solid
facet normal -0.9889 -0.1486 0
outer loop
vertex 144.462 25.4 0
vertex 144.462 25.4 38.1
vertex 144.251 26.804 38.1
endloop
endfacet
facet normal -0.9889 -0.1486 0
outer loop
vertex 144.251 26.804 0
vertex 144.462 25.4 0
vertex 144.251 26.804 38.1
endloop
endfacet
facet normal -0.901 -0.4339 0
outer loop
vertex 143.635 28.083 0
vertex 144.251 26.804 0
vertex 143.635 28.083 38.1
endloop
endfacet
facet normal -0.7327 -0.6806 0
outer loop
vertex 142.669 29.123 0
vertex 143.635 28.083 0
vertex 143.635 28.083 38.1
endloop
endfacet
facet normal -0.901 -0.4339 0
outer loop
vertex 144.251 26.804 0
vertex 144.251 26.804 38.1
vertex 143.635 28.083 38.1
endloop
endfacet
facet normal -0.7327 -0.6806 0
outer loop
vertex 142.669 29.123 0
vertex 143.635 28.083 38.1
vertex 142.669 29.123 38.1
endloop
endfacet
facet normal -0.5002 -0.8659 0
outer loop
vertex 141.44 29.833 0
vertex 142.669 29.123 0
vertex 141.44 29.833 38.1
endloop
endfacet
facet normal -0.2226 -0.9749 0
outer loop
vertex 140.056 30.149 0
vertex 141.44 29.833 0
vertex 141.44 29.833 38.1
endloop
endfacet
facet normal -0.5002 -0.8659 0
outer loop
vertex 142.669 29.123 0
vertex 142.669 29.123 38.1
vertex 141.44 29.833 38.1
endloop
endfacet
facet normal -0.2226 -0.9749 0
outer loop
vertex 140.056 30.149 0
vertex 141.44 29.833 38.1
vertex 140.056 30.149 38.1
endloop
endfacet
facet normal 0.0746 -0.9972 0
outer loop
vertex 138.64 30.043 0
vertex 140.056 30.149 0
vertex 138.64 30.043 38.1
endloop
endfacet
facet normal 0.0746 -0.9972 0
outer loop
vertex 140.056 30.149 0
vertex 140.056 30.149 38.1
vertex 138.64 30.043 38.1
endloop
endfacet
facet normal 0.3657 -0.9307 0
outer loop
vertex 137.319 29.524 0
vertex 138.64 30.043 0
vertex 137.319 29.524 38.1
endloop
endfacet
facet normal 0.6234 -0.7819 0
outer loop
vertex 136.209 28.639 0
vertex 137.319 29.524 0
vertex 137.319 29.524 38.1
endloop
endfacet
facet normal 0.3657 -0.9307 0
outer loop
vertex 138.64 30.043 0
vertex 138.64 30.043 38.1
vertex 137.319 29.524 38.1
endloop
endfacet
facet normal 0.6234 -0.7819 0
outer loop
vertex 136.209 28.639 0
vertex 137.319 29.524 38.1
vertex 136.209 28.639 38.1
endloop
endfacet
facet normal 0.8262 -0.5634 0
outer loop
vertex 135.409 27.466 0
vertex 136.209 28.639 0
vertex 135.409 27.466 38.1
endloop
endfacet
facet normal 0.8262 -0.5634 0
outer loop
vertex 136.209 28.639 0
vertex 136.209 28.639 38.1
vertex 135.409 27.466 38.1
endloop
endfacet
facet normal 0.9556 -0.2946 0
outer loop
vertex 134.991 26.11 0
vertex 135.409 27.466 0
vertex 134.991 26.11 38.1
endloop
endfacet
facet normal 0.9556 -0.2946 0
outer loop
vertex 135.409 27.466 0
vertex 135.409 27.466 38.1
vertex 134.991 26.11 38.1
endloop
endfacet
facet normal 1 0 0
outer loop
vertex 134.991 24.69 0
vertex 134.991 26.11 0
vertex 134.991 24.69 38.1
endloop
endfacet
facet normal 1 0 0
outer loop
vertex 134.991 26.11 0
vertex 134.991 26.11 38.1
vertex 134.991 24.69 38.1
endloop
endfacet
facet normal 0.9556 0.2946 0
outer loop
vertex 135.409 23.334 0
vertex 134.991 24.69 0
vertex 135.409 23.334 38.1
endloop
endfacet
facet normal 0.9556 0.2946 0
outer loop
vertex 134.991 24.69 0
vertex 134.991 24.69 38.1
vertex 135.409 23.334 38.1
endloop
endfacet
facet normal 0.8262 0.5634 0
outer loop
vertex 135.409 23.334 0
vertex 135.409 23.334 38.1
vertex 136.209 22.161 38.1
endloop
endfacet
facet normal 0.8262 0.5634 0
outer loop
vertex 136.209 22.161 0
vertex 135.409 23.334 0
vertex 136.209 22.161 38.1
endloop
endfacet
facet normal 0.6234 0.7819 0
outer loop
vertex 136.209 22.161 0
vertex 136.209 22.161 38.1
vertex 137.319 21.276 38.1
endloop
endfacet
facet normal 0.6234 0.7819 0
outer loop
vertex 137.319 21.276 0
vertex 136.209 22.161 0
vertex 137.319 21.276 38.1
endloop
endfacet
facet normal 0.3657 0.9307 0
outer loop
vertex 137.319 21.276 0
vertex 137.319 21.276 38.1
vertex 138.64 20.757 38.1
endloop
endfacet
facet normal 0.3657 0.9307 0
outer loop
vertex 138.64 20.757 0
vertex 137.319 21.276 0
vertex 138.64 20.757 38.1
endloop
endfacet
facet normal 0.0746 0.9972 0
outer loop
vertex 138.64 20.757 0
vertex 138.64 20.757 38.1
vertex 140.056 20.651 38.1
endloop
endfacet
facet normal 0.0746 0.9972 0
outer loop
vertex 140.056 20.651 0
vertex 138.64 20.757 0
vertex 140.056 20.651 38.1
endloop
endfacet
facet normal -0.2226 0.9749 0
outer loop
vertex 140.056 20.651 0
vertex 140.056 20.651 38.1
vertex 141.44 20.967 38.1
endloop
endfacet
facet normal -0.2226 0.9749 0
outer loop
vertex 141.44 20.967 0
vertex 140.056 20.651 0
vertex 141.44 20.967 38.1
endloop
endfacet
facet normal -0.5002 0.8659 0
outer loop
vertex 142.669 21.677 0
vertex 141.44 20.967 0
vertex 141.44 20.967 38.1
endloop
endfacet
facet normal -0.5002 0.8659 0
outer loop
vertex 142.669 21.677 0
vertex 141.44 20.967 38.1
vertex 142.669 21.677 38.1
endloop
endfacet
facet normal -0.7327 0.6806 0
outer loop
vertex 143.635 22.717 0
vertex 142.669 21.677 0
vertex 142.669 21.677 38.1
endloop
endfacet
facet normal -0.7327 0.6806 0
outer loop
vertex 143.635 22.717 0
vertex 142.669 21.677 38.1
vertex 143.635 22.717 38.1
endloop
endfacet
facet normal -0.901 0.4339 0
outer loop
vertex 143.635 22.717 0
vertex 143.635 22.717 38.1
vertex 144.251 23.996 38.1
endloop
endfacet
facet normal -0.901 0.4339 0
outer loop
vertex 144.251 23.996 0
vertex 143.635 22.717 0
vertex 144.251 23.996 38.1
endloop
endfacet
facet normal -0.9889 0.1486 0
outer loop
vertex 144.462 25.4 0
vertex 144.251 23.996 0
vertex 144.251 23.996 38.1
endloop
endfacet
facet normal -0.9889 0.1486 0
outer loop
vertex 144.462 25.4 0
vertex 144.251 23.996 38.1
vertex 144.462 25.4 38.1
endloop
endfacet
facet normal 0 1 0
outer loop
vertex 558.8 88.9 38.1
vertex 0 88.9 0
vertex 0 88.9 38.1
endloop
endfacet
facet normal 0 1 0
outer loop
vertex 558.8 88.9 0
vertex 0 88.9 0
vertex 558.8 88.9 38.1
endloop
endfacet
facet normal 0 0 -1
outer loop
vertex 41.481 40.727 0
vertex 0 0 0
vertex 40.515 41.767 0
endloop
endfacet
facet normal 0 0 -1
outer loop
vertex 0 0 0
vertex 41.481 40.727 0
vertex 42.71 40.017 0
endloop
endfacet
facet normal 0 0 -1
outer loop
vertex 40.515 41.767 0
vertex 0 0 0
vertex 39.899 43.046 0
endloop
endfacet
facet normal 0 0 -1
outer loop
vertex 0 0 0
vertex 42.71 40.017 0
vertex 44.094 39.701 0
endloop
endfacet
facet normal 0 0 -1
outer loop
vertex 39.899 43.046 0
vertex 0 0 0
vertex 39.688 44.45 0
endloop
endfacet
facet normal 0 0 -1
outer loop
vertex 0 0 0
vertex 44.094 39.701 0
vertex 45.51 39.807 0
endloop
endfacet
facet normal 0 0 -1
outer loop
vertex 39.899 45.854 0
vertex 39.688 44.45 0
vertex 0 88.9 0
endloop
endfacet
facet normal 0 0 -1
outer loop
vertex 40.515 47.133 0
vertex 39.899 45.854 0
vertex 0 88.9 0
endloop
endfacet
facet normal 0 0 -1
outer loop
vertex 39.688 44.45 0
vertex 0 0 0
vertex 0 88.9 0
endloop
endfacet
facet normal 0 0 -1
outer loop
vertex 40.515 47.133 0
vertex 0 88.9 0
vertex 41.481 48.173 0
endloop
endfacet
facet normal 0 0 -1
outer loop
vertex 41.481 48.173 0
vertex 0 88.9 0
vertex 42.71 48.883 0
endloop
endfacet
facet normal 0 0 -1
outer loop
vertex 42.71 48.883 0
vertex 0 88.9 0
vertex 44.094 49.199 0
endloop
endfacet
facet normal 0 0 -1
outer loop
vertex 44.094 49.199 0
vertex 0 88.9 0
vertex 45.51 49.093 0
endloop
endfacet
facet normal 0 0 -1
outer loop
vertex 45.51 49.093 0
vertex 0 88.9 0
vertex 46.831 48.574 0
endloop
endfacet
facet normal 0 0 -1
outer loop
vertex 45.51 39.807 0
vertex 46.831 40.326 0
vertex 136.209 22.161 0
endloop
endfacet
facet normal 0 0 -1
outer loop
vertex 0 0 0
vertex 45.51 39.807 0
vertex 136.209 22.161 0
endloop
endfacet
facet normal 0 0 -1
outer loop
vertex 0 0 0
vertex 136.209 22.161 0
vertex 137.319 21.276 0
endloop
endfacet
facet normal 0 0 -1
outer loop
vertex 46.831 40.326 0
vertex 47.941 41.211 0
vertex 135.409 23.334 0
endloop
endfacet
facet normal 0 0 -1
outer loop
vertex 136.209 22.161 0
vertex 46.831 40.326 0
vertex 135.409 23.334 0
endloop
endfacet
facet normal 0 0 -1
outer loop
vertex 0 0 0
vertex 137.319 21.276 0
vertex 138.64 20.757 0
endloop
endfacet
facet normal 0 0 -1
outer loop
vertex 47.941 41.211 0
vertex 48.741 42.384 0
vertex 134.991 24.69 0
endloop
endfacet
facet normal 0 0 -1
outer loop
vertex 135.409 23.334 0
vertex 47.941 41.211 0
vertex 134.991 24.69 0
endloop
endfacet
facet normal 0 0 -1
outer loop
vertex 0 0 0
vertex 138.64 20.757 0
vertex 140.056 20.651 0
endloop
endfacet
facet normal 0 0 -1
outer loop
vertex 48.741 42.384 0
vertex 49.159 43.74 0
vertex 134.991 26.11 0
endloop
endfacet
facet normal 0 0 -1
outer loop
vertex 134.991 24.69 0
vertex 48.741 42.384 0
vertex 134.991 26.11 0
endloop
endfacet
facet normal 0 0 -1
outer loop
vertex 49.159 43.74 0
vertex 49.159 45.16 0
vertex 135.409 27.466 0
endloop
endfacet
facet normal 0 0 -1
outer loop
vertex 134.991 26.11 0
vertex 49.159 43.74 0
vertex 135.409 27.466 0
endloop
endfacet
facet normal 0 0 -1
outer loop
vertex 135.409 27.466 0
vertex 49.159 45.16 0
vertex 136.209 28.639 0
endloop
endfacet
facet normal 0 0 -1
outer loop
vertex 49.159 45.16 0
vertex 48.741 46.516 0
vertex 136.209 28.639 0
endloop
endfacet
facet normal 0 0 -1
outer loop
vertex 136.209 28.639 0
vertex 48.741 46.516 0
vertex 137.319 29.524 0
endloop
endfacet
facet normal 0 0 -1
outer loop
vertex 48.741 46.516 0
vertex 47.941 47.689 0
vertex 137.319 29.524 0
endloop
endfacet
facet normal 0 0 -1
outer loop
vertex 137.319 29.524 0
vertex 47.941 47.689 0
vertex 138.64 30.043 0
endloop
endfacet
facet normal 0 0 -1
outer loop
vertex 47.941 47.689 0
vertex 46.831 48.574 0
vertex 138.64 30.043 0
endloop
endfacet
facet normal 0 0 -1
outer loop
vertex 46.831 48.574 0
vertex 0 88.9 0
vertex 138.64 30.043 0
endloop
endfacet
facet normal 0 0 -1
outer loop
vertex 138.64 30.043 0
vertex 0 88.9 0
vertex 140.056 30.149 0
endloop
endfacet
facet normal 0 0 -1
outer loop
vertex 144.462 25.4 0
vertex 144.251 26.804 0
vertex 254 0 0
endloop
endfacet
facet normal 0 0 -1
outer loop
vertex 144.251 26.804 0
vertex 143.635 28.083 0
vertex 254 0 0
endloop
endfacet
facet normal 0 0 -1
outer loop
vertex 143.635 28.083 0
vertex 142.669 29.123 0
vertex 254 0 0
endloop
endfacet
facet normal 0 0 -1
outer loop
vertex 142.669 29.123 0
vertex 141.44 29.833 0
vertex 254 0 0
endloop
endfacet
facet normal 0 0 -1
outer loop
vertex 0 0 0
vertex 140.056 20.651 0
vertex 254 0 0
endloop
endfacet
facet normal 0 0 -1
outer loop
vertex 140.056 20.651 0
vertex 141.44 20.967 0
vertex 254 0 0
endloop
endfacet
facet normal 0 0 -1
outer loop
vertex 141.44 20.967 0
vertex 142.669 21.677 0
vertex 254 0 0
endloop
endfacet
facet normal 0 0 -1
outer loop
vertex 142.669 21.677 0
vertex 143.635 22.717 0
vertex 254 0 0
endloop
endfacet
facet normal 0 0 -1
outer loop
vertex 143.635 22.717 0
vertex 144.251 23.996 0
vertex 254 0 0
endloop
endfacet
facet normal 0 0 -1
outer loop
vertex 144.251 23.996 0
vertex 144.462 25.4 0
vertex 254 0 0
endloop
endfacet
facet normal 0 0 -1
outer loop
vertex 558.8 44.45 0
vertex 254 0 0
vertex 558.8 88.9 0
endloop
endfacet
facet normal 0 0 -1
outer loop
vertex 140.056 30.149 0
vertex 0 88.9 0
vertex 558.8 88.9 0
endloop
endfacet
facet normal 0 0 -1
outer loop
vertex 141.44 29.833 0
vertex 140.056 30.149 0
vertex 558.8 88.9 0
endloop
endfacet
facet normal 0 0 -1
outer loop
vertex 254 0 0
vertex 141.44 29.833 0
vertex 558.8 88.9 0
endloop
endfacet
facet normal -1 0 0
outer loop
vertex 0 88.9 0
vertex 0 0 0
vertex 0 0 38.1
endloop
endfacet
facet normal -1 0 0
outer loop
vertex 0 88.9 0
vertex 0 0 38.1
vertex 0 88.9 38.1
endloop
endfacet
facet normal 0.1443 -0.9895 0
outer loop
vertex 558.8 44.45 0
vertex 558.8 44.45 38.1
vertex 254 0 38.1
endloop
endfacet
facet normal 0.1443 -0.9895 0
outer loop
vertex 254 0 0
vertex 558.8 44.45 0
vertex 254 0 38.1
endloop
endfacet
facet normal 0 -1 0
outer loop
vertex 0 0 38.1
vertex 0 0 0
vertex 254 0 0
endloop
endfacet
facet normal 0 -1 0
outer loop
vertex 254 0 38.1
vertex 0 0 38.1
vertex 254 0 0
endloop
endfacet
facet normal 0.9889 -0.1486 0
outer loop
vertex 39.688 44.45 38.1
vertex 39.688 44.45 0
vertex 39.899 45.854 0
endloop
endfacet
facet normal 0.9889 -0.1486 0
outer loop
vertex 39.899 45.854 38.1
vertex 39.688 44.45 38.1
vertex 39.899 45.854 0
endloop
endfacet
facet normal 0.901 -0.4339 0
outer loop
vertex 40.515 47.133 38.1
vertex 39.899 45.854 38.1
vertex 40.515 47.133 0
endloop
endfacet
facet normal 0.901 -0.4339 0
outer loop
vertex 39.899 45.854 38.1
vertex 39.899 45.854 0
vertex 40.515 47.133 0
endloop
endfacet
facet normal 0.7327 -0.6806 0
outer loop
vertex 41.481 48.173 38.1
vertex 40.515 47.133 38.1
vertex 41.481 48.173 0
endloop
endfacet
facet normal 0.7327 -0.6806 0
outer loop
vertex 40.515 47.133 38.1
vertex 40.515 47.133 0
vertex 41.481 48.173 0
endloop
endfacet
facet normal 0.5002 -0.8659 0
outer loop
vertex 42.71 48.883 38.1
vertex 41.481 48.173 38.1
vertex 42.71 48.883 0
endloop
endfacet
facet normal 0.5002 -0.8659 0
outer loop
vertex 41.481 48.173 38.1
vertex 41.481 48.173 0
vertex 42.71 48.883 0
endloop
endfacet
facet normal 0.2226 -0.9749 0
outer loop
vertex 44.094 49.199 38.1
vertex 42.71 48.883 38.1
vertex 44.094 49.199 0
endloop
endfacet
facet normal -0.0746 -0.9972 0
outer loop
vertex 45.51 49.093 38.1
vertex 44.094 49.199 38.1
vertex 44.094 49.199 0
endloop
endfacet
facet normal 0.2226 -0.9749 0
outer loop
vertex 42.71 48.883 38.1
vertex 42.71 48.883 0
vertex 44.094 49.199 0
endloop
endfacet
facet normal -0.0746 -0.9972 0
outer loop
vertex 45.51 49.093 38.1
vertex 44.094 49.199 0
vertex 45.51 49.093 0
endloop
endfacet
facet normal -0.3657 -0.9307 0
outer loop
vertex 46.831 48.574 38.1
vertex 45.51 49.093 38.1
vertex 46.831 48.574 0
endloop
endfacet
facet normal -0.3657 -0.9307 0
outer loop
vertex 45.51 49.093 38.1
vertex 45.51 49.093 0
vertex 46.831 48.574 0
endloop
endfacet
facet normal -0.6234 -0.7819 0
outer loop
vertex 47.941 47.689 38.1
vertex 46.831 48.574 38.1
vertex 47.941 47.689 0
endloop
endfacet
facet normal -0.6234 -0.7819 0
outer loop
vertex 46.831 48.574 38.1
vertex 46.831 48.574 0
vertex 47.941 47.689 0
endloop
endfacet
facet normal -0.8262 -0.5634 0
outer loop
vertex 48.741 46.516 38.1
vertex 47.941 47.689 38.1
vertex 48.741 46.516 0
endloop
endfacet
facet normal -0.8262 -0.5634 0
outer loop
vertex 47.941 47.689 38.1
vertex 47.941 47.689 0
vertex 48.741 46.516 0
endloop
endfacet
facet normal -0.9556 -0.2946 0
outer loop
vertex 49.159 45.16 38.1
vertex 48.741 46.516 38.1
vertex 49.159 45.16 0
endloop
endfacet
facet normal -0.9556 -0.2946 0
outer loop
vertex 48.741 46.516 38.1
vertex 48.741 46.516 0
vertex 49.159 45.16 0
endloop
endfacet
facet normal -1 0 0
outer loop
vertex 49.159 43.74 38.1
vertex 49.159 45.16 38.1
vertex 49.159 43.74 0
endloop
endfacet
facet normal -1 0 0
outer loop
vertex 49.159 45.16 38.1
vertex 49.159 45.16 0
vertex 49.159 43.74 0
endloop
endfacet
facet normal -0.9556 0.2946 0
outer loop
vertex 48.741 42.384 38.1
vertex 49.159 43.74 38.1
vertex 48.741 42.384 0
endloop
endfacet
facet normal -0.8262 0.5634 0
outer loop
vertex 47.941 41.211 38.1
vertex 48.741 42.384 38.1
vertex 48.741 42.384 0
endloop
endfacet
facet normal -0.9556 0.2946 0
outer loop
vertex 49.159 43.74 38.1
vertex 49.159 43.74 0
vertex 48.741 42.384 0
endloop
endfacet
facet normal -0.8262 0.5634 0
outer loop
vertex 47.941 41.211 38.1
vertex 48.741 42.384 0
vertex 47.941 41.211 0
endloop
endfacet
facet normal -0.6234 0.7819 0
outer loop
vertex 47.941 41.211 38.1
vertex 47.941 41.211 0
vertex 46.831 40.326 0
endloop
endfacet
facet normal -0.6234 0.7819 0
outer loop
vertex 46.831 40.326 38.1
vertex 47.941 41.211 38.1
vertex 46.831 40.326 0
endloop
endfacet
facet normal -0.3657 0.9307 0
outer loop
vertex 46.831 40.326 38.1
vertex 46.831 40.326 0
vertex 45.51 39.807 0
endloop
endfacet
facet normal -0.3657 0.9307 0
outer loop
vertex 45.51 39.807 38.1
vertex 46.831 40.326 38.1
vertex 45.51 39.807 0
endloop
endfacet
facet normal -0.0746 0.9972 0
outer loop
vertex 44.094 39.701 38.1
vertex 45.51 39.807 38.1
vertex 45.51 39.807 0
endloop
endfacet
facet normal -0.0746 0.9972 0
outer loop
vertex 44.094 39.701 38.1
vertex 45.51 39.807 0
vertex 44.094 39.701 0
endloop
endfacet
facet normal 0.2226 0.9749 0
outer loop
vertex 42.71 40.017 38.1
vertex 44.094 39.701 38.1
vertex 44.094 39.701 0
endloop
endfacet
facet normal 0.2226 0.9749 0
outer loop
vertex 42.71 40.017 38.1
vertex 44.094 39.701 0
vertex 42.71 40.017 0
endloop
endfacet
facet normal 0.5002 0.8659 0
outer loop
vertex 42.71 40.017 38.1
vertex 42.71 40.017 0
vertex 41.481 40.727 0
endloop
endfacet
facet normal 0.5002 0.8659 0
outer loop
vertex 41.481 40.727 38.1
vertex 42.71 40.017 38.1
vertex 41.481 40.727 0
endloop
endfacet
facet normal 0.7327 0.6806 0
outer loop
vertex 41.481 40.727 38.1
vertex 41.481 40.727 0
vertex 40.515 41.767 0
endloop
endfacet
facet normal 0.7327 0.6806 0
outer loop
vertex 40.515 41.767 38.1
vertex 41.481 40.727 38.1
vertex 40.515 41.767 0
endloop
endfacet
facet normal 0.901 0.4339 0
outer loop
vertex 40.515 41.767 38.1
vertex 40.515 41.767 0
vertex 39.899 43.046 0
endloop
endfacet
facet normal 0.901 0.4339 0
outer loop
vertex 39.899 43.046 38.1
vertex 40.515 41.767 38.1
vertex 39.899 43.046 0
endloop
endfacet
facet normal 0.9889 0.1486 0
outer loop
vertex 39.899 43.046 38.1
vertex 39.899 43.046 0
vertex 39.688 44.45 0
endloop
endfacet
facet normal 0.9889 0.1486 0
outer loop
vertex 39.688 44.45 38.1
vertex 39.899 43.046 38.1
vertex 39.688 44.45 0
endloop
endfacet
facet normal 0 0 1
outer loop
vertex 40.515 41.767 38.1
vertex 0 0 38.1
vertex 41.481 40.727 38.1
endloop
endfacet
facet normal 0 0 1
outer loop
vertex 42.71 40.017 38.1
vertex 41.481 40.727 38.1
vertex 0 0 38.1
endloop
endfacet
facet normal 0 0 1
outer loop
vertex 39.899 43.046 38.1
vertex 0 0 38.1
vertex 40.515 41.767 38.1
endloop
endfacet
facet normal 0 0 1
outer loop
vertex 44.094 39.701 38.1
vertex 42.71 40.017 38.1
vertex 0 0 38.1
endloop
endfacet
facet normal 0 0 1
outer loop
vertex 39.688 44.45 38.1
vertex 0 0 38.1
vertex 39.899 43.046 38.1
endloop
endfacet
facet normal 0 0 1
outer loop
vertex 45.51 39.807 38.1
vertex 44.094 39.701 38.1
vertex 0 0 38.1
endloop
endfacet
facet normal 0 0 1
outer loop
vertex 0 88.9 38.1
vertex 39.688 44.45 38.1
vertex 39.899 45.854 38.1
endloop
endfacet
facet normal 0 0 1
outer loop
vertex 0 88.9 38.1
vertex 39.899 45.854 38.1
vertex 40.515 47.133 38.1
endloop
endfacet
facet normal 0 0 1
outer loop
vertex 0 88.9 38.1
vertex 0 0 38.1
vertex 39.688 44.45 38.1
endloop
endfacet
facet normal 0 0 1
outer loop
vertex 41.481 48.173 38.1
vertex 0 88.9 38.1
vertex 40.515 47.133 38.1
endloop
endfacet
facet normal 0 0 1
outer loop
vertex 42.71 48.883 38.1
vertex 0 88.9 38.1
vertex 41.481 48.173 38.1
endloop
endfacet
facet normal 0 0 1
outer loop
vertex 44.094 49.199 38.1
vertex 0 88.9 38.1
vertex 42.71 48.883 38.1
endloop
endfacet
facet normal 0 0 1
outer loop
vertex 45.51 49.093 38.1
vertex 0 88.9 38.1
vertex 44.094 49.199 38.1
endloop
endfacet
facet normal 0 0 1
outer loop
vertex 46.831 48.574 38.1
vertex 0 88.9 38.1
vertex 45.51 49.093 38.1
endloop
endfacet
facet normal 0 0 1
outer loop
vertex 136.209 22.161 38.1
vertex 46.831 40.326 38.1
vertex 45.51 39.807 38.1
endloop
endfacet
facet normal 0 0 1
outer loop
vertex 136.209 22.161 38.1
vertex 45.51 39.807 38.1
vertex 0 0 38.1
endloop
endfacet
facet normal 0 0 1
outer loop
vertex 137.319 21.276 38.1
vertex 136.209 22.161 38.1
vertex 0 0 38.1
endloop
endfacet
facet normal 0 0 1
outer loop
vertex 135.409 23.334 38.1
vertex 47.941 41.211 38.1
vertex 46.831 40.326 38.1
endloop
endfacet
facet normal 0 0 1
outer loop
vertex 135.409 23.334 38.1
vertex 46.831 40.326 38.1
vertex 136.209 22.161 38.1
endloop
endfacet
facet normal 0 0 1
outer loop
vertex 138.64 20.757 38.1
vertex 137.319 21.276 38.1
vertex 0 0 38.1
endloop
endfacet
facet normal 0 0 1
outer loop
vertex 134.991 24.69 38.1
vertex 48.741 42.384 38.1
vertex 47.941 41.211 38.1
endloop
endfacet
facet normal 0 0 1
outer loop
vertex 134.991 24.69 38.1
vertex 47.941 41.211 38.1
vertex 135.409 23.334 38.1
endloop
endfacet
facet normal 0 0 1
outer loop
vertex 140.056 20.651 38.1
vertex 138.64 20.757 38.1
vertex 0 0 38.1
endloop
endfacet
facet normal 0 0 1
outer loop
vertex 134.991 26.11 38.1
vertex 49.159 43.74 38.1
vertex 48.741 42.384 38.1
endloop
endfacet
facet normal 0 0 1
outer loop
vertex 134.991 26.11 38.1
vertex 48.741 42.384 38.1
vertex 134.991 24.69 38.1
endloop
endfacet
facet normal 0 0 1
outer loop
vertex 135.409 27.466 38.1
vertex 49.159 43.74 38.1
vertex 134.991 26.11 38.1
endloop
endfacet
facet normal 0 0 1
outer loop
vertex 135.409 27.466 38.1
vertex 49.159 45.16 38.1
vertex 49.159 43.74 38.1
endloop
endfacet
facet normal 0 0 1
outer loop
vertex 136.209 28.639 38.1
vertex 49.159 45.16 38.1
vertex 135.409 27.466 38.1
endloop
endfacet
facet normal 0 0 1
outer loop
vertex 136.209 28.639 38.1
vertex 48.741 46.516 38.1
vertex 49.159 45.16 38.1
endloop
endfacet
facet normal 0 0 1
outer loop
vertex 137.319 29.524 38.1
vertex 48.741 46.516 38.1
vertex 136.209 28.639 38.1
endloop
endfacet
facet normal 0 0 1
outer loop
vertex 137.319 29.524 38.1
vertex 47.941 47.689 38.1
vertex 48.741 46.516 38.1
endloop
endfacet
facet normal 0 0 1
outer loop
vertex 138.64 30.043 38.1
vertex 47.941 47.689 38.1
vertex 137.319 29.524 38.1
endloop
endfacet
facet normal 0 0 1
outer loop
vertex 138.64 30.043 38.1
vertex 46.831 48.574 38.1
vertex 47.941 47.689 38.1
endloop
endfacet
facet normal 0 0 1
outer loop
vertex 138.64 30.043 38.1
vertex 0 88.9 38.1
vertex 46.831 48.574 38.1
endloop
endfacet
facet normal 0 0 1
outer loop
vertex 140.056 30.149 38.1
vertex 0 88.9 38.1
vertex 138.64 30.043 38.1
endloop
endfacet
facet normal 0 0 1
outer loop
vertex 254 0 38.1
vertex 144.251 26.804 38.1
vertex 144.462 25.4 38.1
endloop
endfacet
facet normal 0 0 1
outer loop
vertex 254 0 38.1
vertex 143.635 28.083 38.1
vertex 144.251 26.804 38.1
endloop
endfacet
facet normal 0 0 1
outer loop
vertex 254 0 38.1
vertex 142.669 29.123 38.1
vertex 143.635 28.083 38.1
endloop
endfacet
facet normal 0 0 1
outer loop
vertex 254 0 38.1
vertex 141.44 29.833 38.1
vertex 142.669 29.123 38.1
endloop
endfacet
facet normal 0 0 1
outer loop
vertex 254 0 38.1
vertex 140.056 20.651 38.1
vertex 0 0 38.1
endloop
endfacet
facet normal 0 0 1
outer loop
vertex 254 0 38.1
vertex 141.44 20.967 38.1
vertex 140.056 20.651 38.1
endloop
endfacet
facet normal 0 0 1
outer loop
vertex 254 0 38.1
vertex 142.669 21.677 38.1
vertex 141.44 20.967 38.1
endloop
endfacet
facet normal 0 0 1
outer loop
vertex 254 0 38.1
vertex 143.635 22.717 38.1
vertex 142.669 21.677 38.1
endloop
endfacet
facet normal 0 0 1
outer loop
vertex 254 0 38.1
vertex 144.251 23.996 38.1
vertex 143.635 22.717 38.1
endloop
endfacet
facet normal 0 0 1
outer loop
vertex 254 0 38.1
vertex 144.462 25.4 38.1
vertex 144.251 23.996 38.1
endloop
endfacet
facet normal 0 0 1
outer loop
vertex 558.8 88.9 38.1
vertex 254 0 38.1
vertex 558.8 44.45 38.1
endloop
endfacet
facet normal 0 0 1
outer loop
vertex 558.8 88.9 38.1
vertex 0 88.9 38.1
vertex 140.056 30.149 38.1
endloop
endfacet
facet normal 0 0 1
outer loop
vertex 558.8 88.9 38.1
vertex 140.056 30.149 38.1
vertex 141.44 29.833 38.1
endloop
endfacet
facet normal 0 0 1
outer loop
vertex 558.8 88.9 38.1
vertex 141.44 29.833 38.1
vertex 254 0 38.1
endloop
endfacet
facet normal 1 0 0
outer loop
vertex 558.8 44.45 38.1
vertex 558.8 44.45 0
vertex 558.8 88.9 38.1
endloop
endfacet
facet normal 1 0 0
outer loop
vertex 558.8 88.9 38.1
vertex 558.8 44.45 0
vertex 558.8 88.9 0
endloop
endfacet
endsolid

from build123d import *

# Parameters (mm, degrees)
SKETCH1_W                        = 558.8
SKETCH1_H                        = 88.9
BOSS_EXTRUDE1_DEPTH              = 38.1
CUT_EXTRUDE1_DEPTH               = 568.108684469
F_3_8_0_375_DIAMETER_HOLE1_D     = 9.525
F_3_8_0_375_DIAMETER_HOLE1_DEPTH = 76.2
F_3_8_0_375_DIAMETER_HOLE1_TIP   = 2.861598698
SKETCH8_R                        = 4.7625
CUT_EXTRUDE2_DEPTH               = 568.108684469


with BuildPart() as part:
    # Sketch1 → Boss-Extrude1 (new body)
    with BuildSketch(Plane.XY):
        with Locations((279.4, 44.45)):
            Rectangle(SKETCH1_W, SKETCH1_H)
    extrude(amount=BOSS_EXTRUDE1_DEPTH)

    # Sketch2 → Cut-Extrude1 (cut, through all)
    with BuildSketch(Plane.XY.offset(38.1)):
        Polygon((558.8, 44.45), (254, 0), (558.8, 0), align=None)
    extrude(amount=-CUT_EXTRUDE1_DEPTH, mode=Mode.SUBTRACT)

    # 3/8 (0.375) Diameter Hole1
    with Locations(Plane.XY.offset(38.1)):
        with Locations((44.45, 44.45)):
            Hole(F_3_8_0_375_DIAMETER_HOLE1_D / 2, depth=F_3_8_0_375_DIAMETER_HOLE1_DEPTH)
            with Locations((0, 0, -(F_3_8_0_375_DIAMETER_HOLE1_DEPTH + F_3_8_0_375_DIAMETER_HOLE1_TIP / 2))):  # 118° drill point
                Cone(0, F_3_8_0_375_DIAMETER_HOLE1_D / 2, F_3_8_0_375_DIAMETER_HOLE1_TIP, mode=Mode.SUBTRACT)

    # Sketch8 → Cut-Extrude2 (cut, through all)
    with BuildSketch(Plane.XY.offset(38.1)):
        with Locations((139.7, 25.4)):
            Circle(SKETCH8_R)
    extrude(amount=-CUT_EXTRUDE2_DEPTH, mode=Mode.SUBTRACT)


solid = part.part
